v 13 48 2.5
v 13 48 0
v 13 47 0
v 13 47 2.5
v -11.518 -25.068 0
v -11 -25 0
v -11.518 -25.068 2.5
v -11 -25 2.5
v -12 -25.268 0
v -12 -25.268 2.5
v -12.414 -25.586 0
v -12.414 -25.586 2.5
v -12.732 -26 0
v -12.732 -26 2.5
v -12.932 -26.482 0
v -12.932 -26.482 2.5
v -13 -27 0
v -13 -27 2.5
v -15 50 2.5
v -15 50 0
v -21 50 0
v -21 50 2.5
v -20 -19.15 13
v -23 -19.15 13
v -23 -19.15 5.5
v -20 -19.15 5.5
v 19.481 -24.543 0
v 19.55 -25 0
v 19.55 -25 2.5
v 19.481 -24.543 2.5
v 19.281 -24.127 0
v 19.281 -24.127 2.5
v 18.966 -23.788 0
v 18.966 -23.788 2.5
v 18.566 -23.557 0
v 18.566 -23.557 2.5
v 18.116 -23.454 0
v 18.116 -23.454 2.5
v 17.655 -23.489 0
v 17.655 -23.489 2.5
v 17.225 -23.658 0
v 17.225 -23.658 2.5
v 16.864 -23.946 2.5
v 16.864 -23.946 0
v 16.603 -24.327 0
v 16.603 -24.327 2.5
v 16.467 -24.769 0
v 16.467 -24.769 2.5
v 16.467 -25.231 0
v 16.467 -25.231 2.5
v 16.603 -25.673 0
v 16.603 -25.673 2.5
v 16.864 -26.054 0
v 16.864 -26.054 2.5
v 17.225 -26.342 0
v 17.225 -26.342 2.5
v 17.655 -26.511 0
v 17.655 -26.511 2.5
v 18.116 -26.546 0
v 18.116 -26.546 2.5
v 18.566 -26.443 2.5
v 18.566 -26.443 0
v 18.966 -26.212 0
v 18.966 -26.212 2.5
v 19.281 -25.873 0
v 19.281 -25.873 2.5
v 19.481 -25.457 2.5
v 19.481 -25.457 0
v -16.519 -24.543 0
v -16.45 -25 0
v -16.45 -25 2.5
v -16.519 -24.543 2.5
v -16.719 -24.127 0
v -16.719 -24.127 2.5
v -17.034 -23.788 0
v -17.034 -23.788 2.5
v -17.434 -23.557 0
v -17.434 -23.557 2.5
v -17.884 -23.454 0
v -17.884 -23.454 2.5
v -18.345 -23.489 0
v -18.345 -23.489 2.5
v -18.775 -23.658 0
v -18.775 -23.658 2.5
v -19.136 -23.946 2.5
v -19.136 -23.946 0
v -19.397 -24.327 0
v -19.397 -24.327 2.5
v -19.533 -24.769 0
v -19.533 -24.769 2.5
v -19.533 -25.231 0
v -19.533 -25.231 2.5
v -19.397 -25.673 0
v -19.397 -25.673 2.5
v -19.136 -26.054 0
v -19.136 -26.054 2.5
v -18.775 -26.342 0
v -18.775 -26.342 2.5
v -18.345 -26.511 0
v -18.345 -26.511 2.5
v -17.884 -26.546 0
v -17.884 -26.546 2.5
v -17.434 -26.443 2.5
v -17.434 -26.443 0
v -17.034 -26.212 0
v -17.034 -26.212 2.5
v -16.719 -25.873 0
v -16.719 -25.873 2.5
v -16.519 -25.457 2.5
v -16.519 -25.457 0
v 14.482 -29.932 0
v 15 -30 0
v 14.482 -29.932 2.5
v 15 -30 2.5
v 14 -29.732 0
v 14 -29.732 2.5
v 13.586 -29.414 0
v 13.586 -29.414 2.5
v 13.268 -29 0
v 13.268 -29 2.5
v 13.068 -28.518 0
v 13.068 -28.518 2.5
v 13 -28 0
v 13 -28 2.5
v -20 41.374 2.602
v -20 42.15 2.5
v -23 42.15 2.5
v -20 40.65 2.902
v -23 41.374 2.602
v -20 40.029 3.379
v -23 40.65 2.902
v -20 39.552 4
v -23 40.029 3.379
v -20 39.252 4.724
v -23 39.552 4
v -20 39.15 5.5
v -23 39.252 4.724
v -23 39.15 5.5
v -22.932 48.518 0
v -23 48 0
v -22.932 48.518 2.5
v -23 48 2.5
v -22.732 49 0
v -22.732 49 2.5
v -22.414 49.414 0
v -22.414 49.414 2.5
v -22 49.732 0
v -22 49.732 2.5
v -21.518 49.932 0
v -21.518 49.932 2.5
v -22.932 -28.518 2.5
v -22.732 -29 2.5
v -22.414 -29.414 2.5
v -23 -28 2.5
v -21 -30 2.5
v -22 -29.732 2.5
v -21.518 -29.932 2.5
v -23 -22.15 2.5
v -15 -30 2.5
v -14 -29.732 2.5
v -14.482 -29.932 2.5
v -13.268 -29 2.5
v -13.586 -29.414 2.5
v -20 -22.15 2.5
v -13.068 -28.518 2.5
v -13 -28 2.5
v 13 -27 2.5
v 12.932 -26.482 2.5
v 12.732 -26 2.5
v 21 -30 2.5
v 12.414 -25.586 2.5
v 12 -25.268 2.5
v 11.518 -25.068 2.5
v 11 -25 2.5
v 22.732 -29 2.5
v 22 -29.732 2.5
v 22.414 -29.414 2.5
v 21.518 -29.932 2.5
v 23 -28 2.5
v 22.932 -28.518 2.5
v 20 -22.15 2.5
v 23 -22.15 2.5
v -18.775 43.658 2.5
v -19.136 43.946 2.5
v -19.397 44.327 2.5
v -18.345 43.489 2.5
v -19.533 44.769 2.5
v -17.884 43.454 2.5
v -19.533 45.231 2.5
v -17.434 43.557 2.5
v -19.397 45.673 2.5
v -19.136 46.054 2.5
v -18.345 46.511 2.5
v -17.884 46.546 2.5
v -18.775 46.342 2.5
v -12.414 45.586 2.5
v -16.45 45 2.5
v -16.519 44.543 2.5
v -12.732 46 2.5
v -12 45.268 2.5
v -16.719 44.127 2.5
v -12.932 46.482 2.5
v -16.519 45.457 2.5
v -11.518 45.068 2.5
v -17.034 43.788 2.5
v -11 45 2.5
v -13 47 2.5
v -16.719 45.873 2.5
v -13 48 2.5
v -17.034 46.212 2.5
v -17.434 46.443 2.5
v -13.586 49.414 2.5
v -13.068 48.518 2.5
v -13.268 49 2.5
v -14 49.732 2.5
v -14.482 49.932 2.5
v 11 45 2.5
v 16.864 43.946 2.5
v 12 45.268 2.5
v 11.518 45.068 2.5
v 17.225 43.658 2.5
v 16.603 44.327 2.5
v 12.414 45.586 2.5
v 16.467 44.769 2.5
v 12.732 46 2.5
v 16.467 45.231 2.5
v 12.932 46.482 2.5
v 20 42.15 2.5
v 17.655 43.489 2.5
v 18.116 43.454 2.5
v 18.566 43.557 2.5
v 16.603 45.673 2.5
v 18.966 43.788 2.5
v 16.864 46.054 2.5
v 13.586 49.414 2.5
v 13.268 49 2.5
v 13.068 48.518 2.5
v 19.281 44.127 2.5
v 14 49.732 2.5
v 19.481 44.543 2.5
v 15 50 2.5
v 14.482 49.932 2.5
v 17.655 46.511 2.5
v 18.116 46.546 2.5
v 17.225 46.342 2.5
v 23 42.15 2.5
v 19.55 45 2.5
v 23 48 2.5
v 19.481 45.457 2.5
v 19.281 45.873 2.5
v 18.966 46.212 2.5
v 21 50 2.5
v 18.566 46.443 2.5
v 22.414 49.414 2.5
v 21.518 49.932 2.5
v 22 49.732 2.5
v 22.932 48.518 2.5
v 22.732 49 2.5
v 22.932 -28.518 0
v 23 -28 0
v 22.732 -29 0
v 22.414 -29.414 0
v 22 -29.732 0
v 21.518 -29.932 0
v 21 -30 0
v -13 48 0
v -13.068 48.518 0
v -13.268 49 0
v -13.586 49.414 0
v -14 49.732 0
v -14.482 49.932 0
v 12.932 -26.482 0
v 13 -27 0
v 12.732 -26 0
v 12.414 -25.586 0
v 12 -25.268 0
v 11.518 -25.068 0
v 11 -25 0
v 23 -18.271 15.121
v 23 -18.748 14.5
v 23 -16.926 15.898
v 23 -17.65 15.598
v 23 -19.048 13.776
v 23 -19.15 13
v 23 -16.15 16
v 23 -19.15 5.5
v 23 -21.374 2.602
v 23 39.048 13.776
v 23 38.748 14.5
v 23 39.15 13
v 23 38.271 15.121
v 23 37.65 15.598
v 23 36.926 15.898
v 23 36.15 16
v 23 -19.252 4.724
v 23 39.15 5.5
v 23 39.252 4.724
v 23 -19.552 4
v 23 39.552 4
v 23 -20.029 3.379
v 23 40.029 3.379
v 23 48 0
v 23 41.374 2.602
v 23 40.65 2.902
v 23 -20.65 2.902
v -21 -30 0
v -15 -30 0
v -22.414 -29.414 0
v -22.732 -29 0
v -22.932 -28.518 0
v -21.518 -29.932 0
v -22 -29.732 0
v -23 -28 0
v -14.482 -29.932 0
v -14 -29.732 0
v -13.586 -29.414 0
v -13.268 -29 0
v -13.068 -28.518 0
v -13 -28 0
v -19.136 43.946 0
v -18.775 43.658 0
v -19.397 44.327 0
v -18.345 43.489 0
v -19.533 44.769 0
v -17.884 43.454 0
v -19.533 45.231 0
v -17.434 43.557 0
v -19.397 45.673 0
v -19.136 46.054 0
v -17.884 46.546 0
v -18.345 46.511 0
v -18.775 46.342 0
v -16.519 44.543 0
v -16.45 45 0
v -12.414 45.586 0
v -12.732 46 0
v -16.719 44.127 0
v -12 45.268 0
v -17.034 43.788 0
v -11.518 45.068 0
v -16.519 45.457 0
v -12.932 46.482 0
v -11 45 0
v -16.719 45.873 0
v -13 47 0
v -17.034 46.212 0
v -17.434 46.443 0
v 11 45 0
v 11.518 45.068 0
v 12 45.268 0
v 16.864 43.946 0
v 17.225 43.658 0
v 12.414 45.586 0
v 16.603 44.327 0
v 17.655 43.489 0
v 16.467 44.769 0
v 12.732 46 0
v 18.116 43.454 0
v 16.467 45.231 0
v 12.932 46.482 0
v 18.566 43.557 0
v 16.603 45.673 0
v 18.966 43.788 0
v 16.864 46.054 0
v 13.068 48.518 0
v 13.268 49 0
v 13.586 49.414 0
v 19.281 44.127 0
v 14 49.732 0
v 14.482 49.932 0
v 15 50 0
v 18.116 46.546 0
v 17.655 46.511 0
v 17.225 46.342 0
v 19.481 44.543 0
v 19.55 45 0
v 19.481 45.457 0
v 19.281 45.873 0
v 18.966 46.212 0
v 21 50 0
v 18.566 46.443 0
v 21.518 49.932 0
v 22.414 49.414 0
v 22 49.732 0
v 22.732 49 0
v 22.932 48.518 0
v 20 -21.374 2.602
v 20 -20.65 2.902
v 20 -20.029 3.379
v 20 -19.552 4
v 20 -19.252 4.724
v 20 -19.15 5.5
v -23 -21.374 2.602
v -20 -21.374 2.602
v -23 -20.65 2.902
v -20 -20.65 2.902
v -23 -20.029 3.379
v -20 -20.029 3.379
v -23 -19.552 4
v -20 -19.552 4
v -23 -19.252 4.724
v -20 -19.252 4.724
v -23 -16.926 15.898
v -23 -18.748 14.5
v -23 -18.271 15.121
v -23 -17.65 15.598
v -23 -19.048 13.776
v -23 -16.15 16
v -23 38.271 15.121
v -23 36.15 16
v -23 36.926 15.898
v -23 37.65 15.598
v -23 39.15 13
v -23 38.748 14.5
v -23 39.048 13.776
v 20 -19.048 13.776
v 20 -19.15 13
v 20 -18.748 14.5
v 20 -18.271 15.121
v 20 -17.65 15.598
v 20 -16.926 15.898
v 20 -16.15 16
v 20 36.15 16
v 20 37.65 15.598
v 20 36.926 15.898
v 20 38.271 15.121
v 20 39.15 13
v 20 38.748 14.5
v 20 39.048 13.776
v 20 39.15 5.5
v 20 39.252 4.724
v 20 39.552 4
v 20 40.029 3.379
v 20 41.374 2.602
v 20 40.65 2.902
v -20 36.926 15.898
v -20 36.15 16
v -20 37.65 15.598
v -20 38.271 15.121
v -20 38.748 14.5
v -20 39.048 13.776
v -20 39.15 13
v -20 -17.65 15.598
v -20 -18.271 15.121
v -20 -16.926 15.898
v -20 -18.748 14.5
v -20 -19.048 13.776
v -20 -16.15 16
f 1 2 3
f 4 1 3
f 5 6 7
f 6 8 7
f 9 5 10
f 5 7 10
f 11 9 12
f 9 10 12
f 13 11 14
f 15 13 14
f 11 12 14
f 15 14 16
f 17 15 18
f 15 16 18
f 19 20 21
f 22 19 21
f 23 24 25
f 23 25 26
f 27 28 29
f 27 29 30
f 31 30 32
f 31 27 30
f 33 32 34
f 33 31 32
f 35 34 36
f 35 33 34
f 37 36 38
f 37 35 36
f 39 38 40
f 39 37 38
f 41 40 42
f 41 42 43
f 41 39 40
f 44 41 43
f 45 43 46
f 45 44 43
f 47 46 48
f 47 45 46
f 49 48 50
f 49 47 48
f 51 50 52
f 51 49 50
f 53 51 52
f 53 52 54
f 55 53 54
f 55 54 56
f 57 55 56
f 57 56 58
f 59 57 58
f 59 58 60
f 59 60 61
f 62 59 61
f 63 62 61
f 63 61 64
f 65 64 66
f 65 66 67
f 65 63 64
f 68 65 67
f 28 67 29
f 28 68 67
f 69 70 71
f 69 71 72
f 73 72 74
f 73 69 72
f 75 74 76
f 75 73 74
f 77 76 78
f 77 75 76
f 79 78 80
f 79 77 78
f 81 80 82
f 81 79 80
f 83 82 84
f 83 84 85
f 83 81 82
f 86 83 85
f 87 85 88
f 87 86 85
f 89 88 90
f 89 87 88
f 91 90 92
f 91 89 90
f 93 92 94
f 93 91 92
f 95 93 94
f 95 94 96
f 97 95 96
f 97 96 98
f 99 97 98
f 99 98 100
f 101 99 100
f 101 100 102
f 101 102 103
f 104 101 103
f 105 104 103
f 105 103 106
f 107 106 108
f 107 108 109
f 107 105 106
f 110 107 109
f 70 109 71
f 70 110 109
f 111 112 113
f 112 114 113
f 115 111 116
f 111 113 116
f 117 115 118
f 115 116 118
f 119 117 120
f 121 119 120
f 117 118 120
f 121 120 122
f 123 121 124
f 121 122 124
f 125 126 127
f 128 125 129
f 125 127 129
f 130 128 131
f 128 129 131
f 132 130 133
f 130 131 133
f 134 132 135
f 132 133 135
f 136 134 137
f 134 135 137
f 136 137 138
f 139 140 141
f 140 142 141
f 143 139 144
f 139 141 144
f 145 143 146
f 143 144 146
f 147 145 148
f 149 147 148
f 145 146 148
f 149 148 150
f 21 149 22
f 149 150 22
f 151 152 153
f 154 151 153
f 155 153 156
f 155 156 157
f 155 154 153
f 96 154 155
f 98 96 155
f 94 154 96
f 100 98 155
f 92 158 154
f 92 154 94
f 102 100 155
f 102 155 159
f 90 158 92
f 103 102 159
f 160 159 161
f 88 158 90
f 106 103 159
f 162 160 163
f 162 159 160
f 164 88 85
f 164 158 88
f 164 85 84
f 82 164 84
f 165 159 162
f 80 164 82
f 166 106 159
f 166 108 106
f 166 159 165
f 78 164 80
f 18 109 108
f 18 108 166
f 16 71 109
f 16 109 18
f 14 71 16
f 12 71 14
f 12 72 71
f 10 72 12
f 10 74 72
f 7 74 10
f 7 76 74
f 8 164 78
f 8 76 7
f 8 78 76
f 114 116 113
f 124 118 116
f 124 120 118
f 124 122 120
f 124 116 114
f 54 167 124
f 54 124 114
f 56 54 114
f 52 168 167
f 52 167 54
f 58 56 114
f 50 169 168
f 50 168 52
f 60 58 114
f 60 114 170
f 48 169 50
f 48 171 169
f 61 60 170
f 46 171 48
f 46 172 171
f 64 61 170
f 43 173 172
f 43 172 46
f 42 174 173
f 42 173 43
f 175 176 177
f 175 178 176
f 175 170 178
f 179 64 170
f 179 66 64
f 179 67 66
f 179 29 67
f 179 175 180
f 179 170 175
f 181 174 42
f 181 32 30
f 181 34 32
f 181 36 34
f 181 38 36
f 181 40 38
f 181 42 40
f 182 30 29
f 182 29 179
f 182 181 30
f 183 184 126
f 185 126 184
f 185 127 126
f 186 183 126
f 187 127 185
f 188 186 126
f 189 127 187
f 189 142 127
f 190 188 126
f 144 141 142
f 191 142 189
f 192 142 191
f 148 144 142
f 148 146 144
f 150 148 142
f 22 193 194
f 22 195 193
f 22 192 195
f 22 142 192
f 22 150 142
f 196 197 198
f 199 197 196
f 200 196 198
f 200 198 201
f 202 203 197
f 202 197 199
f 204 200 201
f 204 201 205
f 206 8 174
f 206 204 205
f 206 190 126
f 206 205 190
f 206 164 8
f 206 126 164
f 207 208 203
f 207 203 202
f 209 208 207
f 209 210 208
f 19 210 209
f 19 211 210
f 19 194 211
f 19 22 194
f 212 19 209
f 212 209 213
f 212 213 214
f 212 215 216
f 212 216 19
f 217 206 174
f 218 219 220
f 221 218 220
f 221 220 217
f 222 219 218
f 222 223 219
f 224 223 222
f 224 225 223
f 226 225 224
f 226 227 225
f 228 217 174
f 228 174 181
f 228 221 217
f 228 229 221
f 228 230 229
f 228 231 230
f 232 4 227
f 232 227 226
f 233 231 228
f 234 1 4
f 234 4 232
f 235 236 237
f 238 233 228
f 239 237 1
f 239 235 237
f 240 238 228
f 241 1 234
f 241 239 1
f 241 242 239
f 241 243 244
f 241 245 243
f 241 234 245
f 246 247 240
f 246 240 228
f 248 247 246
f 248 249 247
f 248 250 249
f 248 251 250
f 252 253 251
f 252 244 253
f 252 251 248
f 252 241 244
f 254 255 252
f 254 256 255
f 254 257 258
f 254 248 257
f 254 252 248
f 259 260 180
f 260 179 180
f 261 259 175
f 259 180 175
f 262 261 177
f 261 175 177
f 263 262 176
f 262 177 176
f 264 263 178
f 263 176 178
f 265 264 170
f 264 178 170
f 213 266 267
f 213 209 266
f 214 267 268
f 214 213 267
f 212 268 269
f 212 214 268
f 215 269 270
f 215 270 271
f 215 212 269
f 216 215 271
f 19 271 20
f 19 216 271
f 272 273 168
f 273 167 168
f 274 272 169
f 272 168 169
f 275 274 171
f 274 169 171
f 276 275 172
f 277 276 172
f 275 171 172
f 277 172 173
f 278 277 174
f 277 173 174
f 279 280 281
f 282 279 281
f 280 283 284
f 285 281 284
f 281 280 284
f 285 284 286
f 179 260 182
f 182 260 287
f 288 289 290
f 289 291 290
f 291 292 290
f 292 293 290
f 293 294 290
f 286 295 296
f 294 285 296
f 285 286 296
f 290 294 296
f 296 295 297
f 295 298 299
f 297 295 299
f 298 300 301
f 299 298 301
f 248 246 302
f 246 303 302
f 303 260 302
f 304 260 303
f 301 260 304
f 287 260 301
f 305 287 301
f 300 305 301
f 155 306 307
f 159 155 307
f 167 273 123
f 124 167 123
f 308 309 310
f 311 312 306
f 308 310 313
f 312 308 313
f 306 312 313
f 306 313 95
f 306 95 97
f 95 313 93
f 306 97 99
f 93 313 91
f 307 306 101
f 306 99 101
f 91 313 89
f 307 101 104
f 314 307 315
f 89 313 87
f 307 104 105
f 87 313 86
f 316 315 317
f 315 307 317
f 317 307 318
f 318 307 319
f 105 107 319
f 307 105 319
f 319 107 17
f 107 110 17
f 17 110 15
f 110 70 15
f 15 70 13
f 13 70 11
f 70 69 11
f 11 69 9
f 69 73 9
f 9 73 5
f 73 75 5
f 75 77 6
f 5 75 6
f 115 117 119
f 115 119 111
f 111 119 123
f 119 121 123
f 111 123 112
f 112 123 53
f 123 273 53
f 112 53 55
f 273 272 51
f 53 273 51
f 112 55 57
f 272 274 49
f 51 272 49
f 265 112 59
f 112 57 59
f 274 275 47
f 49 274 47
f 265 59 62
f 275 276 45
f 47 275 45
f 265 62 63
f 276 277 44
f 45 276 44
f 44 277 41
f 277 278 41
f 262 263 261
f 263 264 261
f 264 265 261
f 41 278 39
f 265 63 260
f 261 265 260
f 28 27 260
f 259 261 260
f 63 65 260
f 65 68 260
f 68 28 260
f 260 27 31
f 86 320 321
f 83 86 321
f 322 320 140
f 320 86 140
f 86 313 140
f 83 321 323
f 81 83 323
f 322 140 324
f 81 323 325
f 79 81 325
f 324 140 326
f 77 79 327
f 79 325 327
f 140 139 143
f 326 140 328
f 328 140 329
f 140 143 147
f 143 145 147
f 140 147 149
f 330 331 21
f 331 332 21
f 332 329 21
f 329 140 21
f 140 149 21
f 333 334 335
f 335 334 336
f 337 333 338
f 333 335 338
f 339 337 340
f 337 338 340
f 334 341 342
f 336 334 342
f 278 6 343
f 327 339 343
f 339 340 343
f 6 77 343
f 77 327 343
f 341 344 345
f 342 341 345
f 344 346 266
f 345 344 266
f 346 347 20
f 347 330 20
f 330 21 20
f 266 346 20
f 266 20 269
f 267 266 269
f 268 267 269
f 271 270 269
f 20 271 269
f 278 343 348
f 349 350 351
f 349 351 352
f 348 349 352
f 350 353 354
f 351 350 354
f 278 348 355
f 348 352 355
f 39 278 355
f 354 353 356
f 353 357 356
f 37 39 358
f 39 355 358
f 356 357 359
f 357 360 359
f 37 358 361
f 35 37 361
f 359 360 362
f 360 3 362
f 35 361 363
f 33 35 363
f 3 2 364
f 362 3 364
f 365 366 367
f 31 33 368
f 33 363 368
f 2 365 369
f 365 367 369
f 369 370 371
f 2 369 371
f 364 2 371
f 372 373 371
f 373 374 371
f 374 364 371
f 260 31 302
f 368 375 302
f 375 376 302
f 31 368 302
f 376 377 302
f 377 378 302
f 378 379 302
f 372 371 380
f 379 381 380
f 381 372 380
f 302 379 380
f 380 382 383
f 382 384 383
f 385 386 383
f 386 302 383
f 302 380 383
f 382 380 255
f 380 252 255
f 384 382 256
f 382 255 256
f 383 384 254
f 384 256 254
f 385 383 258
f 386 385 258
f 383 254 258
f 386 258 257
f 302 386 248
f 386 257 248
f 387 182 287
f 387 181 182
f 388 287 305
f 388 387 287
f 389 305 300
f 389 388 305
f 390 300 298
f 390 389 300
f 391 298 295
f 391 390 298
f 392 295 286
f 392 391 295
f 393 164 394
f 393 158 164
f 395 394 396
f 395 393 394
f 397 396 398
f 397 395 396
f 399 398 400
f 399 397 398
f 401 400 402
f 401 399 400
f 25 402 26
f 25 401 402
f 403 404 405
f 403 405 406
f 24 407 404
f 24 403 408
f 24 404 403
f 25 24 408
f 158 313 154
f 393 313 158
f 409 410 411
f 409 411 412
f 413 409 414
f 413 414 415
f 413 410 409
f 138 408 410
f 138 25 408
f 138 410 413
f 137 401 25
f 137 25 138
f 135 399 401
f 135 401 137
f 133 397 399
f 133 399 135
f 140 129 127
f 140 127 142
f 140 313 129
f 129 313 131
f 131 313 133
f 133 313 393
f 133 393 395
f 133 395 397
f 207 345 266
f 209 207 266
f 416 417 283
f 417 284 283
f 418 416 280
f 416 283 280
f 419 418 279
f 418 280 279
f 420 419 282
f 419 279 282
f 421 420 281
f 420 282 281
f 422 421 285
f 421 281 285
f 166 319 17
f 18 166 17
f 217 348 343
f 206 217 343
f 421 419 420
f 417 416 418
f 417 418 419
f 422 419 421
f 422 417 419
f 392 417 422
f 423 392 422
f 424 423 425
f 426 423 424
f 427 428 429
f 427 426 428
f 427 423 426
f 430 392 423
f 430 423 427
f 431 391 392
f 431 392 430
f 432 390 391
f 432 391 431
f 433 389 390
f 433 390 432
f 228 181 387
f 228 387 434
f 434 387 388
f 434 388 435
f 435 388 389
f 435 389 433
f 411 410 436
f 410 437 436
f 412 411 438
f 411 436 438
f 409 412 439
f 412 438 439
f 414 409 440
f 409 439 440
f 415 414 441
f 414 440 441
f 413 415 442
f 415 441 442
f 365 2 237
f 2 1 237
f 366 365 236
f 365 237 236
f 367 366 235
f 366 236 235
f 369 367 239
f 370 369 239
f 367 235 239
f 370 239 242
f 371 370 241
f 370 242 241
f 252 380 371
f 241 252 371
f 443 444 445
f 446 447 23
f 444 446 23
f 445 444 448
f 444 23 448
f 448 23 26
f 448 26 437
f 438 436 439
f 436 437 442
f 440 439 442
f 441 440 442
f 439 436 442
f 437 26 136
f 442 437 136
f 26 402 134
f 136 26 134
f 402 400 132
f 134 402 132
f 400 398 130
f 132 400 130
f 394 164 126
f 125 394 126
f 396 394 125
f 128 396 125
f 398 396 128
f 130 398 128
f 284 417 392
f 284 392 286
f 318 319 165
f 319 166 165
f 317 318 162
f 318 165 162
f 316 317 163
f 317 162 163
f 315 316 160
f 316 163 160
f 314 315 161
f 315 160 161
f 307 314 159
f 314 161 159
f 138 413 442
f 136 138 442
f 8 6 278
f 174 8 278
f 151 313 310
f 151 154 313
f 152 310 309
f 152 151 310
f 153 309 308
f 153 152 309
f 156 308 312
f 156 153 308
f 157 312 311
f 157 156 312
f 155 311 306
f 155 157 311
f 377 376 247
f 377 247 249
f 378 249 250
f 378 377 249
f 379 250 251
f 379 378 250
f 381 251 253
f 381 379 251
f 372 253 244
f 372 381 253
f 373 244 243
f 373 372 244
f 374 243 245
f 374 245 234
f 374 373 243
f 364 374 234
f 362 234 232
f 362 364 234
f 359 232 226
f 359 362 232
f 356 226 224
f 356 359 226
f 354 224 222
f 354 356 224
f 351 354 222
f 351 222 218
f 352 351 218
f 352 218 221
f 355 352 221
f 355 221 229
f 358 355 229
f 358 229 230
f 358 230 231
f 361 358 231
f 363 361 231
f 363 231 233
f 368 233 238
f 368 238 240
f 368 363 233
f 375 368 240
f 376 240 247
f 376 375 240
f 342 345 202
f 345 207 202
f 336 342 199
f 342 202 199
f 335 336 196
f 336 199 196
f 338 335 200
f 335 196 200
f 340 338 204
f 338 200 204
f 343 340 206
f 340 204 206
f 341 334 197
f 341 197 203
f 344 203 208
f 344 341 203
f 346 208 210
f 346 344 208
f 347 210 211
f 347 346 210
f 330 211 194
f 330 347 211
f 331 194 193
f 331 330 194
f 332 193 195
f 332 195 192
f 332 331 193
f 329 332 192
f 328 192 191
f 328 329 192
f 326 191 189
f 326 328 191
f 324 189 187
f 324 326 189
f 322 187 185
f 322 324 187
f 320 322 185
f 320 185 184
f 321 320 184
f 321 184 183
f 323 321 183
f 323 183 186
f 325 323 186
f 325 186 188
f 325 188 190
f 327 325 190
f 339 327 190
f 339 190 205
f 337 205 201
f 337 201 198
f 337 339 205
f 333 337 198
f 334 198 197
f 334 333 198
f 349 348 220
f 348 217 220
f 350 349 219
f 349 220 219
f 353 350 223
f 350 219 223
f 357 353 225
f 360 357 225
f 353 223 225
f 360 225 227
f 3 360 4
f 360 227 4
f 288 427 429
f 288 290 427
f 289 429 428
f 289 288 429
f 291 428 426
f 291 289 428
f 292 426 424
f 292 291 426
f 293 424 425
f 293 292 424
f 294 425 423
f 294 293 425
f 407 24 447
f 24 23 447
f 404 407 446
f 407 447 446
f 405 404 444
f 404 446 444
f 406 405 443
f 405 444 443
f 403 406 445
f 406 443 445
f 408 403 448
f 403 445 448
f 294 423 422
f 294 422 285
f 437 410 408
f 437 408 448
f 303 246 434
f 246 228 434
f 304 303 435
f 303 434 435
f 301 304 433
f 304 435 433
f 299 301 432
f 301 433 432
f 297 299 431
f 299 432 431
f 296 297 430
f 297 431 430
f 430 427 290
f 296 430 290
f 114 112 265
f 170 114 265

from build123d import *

# Parameters (mm, degrees)
SKETCH1_R           = 1.55
BOSS_EXTRUDE2_DEPTH = 2.5
SKETCH1_4_W         = 3
SKETCH1_4_H         = 58.3
BOSS_EXTRUDE3_DEPTH = 16
FILLET1_R           = 2
FILLET2_R           = 3


with BuildPart() as part:
    # Sketch1 → Boss-Extrude2 (new body)
    with BuildSketch(Plane.XY):
        Polygon((-23, -30), (-13, -30), (-13, -25), (13, -25), (13, -30), (23, -30), (23, 50), (13, 50), (13, 45), (-13, 45), (-13, 50), (-23, 50), align=None)
        with Locations((-18, 45)):
            Circle(SKETCH1_R, mode=Mode.SUBTRACT)
        with Locations((18, 45)):
            Circle(SKETCH1_R, mode=Mode.SUBTRACT)
        with Locations((18, -25)):
            Circle(SKETCH1_R, mode=Mode.SUBTRACT)
        with Locations((-18, -25)):
            Circle(SKETCH1_R, mode=Mode.SUBTRACT)
    extrude(amount=BOSS_EXTRUDE2_DEPTH)

    # Sketch1<4> → Boss-Extrude3 (add)
    with BuildSketch(Plane.XY):
        with Locations((-21.5, 10)):
            Rectangle(SKETCH1_4_W, SKETCH1_4_H)
        with Locations((21.5, 10)):
            Rectangle(SKETCH1_4_W, SKETCH1_4_H)
    extrude(amount=BOSS_EXTRUDE3_DEPTH)

    # Fillet1
    fillet1_edges = [part.edges().sort_by_distance(p)[0] for p in [
        (-23, -30, 1.25),
        (-13, -30, 1.25),
        (-13, -25, 1.25),
        (13, -25, 1.25),
        (13, -30, 1.25),
        (23, -30, 1.25),
        (13, 50, 1.25),
        (13, 45, 1.25),
        (-13, 45, 1.25),
        (-13, 50, 1.25),
        (-23, 50, 1.25),
        (23, 50, 1.25),
    ]]
    fillet(fillet1_edges, radius=FILLET1_R)

    # Fillet2
    fillet2_edges = [part.edges().sort_by_distance(p)[0] for p in [
        (-21.5, -19.15, 2.5),
        (-21.5, -19.15, 16),
        (-21.5, 39.15, 16),
        (-21.5, 39.15, 2.5),
        (21.5, -19.15, 16),
        (21.5, -19.15, 2.5),
        (21.5, 39.15, 16),
        (21.5, 39.15, 2.5),
    ]]
    fillet(fillet2_edges, radius=FILLET2_R)


solid = part.part
